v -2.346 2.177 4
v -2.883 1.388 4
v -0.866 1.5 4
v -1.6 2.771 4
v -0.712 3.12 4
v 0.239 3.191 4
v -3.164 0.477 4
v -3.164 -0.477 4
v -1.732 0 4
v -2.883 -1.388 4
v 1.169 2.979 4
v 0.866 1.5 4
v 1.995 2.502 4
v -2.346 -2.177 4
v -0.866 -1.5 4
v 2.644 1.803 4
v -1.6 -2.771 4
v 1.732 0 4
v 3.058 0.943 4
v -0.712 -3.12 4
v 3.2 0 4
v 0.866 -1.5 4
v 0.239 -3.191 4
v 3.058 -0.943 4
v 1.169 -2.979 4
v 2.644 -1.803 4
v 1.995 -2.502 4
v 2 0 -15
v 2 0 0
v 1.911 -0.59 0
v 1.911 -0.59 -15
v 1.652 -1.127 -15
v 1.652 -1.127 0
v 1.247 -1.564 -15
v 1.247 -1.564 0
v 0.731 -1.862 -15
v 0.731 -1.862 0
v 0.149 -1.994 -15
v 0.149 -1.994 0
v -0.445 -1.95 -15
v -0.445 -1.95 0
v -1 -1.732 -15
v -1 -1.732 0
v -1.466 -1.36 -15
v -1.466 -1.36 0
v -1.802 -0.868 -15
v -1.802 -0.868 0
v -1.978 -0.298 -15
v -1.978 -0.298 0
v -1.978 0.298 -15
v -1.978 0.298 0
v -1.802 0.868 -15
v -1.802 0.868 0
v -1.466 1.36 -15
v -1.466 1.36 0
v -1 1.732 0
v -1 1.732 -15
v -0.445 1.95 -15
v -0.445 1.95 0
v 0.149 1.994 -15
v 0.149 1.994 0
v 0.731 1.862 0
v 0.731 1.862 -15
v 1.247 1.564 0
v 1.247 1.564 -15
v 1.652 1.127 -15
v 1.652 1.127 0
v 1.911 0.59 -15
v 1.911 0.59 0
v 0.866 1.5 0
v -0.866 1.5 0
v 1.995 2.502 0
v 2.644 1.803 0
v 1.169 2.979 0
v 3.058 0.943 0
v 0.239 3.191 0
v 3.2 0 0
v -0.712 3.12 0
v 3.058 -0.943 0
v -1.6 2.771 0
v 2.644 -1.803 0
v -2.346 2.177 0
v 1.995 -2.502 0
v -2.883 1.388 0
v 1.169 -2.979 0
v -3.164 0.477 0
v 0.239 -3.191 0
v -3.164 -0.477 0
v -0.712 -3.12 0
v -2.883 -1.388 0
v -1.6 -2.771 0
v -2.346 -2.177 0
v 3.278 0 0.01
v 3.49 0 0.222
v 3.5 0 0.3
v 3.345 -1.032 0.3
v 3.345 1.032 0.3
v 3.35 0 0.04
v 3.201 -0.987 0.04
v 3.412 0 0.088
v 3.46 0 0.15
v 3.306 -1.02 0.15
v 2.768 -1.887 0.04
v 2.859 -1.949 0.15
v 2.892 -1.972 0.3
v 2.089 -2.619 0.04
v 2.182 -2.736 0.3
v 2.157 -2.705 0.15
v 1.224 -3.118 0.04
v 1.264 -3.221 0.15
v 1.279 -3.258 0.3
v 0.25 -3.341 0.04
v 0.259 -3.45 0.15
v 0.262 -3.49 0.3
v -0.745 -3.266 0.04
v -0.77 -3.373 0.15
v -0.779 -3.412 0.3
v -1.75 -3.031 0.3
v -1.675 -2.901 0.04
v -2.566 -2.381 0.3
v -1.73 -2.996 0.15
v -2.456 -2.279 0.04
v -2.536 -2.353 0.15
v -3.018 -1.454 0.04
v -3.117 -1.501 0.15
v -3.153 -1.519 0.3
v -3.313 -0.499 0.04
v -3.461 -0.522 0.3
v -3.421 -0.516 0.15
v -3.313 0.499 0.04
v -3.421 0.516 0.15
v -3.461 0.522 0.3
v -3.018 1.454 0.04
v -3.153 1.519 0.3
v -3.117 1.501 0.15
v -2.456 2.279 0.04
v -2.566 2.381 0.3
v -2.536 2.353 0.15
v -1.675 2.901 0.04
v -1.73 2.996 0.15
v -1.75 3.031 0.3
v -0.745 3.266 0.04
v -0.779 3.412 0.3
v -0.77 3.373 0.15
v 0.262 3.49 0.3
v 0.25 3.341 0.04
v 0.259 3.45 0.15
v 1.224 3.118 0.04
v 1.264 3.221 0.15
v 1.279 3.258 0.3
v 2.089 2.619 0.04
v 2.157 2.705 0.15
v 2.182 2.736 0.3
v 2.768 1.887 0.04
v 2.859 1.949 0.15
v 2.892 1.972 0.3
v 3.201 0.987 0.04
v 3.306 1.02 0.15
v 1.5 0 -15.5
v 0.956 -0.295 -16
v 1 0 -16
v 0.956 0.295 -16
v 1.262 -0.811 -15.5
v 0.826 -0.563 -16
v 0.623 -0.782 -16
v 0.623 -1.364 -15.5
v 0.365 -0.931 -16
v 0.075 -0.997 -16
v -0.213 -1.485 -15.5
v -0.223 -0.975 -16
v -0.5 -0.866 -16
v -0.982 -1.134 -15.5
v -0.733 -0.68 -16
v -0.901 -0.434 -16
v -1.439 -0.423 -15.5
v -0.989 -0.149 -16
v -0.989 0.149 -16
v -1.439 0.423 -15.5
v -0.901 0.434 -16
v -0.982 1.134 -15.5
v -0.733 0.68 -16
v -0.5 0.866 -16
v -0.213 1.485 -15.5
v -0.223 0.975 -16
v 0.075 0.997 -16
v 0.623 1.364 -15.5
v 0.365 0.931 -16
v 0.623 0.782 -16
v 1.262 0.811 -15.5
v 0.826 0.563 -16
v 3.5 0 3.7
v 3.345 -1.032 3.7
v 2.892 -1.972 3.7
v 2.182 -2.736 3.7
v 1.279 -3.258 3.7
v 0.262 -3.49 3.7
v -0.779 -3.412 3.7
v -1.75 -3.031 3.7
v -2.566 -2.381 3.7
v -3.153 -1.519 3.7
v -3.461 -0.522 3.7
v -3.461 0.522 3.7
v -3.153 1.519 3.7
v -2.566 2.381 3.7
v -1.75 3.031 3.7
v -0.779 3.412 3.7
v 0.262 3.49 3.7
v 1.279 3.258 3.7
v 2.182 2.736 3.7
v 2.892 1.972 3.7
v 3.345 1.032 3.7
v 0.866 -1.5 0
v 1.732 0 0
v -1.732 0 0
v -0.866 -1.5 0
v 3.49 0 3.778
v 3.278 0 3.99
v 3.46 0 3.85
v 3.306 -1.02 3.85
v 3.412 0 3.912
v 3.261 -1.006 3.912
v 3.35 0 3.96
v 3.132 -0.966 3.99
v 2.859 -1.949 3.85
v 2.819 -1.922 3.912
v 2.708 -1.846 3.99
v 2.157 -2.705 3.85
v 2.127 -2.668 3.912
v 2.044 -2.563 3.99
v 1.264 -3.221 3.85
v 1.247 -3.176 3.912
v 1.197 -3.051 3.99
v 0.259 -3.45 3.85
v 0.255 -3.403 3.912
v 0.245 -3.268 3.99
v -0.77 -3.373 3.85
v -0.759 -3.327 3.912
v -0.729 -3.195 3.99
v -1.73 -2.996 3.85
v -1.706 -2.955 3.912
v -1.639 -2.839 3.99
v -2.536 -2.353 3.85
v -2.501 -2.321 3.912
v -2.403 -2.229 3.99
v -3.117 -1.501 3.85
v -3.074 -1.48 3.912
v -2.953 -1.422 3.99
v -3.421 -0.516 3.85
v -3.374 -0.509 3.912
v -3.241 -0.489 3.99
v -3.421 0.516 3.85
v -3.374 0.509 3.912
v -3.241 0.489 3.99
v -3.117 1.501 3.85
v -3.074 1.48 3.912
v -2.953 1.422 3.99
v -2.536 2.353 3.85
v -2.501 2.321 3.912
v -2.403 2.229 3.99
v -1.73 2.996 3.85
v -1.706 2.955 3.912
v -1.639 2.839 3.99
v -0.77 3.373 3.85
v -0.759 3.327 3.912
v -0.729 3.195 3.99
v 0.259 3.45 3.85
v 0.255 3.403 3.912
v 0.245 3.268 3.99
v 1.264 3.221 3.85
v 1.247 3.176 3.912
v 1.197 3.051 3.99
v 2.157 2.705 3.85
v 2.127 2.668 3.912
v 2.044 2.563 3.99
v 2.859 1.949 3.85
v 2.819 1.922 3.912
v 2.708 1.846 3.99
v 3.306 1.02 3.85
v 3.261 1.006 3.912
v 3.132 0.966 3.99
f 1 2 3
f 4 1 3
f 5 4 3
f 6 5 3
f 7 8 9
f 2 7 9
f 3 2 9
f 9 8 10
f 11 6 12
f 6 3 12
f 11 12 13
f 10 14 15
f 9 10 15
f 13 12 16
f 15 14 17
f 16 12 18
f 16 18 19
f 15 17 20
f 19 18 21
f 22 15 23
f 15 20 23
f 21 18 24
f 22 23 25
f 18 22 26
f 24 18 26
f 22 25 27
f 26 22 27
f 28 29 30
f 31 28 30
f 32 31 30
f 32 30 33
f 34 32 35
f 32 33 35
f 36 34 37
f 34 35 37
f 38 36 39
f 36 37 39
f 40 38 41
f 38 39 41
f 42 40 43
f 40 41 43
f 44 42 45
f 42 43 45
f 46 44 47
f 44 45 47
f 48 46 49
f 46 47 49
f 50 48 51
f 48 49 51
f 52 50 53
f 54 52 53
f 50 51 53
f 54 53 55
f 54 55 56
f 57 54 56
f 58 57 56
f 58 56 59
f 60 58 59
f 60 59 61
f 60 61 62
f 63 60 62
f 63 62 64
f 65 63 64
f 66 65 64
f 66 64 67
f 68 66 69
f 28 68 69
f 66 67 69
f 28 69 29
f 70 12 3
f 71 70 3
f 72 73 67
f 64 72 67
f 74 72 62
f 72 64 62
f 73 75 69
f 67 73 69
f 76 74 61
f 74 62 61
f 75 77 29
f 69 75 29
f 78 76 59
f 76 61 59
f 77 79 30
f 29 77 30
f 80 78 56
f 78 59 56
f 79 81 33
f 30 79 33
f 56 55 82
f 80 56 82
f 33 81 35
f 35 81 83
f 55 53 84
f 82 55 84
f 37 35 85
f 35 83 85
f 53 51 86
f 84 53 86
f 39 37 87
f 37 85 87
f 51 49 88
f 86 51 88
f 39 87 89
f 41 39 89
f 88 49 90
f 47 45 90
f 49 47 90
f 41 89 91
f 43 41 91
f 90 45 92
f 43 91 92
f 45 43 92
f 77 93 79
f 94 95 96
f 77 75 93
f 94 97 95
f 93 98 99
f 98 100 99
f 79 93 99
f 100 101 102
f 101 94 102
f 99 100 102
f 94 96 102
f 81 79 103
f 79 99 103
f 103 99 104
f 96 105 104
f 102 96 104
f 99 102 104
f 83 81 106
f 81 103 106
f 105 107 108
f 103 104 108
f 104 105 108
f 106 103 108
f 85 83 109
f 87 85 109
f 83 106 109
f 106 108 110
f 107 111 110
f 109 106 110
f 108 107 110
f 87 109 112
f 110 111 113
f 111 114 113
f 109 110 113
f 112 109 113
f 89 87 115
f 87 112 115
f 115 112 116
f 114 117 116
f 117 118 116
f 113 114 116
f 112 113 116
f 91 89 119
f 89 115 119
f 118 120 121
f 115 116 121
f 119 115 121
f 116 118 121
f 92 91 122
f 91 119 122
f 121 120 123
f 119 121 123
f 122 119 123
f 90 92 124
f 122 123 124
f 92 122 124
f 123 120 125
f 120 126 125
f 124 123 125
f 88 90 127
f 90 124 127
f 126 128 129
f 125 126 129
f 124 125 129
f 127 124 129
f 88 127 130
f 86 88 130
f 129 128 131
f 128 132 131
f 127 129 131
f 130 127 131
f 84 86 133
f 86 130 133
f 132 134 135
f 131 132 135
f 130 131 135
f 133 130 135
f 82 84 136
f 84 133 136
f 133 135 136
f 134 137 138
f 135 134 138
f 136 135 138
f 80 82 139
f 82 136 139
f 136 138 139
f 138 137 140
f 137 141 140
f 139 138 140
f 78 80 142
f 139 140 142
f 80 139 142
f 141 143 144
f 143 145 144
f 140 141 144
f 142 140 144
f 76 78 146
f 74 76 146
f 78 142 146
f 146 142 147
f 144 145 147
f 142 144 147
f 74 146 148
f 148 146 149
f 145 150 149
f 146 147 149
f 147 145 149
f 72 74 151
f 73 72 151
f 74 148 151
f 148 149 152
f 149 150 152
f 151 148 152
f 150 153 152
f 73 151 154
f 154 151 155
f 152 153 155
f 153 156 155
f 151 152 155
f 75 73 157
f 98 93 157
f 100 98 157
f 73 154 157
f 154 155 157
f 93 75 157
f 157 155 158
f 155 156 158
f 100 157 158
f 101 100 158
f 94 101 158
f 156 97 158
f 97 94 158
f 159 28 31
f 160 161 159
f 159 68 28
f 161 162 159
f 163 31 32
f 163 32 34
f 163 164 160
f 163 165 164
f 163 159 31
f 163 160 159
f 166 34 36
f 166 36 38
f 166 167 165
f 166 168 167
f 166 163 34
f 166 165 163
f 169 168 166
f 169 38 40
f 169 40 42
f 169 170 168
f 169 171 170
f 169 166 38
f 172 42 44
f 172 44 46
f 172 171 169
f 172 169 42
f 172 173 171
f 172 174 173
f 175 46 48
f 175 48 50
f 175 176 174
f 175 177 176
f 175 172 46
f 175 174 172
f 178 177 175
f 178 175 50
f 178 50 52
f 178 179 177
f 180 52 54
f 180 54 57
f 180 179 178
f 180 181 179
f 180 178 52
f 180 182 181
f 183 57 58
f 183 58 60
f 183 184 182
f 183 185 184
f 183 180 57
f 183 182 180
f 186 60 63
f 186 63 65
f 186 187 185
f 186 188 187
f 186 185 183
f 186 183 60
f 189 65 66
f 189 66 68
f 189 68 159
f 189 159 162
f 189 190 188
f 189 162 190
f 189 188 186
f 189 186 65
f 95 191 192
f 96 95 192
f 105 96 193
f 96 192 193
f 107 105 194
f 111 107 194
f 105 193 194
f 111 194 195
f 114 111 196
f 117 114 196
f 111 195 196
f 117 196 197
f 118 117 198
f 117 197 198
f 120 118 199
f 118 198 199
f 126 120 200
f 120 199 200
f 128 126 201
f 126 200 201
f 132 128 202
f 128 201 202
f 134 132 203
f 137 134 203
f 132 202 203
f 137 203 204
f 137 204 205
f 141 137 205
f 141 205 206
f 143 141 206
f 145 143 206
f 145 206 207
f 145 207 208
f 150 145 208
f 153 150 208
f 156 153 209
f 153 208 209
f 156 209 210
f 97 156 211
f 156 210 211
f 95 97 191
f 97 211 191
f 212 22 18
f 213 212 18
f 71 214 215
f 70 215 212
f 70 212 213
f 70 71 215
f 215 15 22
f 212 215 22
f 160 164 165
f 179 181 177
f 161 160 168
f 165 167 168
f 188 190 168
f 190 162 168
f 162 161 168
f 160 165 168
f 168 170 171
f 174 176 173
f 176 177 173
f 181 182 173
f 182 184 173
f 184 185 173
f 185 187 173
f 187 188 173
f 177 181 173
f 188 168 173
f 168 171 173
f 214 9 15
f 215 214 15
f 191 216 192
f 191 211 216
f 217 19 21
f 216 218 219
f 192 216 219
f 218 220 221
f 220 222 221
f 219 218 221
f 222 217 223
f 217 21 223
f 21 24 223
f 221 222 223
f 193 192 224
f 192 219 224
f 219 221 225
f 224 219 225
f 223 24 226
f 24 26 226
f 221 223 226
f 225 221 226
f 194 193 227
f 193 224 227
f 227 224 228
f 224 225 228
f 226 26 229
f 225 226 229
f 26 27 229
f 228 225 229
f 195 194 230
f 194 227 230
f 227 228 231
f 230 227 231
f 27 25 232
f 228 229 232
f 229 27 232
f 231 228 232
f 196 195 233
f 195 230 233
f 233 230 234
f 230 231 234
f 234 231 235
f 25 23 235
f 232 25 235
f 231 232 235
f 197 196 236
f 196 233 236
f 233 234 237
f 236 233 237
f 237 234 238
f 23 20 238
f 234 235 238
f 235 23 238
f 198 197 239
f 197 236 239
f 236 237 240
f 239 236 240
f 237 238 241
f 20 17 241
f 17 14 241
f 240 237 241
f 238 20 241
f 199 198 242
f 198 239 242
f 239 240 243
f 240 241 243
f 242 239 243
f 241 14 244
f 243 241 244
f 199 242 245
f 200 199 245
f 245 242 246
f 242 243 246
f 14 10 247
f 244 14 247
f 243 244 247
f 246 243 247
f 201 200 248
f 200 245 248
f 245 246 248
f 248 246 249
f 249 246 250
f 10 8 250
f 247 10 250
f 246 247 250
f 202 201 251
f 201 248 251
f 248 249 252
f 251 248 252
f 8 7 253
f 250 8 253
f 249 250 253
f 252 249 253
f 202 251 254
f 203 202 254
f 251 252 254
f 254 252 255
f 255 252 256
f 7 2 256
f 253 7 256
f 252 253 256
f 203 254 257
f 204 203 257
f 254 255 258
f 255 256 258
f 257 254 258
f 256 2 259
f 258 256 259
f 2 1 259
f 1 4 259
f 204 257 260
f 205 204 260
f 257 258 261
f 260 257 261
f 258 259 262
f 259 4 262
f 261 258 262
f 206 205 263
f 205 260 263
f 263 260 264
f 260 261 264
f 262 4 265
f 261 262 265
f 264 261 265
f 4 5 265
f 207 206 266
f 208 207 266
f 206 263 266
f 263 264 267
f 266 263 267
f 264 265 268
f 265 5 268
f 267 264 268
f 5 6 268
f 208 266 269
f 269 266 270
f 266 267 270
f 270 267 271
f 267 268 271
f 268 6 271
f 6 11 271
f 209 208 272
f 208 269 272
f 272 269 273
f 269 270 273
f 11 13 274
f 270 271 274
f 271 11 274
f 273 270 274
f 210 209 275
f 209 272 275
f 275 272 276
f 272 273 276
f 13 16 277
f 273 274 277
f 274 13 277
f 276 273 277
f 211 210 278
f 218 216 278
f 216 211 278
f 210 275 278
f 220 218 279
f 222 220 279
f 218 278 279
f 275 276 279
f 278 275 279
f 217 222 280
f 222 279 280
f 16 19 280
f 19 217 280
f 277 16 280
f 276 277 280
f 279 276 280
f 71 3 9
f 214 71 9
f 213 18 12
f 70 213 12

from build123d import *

# Parameters (mm, degrees)
F3_DEPTH = 4
F4_SIZE  = 1
F5_R     = 0.3


with BuildPart() as f1:
    # F0 (on Front) → F1 (revolve)
    with BuildSketch(Plane.XZ):
        Polygon((3.5, 4), (0, 4), (0, -16), (2, -16), (2, 0), (3.5, 0), align=None)
    revolve(axis=Axis((0, 0, -50.553678), (0, 0, -1)))

    # F2 (on face) → F3 (cut)
    with BuildSketch(Plane.XY.offset(4)):
        Polygon((0.866025, 1.5), (-0.866025, 1.5), (-1.732051, 0), (-0.866025, -1.5), (0.866025, -1.5), (1.732051, 0), align=None)
    extrude(amount=-F3_DEPTH, mode=Mode.SUBTRACT)

    # F4
    f4_edges = [f1.edges().sort_by_distance(p)[0] for p in [
        (-2, 0, -16),
    ]]
    chamfer(f4_edges, length=F4_SIZE)

    # F5
    f5_edges = [f1.edges().sort_by_distance(p)[0] for p in [
        (-3.5, 0, 0),
        (-3.5, 0, 4),
    ]]
    fillet(f5_edges, radius=F5_R)


solid = f1.part
